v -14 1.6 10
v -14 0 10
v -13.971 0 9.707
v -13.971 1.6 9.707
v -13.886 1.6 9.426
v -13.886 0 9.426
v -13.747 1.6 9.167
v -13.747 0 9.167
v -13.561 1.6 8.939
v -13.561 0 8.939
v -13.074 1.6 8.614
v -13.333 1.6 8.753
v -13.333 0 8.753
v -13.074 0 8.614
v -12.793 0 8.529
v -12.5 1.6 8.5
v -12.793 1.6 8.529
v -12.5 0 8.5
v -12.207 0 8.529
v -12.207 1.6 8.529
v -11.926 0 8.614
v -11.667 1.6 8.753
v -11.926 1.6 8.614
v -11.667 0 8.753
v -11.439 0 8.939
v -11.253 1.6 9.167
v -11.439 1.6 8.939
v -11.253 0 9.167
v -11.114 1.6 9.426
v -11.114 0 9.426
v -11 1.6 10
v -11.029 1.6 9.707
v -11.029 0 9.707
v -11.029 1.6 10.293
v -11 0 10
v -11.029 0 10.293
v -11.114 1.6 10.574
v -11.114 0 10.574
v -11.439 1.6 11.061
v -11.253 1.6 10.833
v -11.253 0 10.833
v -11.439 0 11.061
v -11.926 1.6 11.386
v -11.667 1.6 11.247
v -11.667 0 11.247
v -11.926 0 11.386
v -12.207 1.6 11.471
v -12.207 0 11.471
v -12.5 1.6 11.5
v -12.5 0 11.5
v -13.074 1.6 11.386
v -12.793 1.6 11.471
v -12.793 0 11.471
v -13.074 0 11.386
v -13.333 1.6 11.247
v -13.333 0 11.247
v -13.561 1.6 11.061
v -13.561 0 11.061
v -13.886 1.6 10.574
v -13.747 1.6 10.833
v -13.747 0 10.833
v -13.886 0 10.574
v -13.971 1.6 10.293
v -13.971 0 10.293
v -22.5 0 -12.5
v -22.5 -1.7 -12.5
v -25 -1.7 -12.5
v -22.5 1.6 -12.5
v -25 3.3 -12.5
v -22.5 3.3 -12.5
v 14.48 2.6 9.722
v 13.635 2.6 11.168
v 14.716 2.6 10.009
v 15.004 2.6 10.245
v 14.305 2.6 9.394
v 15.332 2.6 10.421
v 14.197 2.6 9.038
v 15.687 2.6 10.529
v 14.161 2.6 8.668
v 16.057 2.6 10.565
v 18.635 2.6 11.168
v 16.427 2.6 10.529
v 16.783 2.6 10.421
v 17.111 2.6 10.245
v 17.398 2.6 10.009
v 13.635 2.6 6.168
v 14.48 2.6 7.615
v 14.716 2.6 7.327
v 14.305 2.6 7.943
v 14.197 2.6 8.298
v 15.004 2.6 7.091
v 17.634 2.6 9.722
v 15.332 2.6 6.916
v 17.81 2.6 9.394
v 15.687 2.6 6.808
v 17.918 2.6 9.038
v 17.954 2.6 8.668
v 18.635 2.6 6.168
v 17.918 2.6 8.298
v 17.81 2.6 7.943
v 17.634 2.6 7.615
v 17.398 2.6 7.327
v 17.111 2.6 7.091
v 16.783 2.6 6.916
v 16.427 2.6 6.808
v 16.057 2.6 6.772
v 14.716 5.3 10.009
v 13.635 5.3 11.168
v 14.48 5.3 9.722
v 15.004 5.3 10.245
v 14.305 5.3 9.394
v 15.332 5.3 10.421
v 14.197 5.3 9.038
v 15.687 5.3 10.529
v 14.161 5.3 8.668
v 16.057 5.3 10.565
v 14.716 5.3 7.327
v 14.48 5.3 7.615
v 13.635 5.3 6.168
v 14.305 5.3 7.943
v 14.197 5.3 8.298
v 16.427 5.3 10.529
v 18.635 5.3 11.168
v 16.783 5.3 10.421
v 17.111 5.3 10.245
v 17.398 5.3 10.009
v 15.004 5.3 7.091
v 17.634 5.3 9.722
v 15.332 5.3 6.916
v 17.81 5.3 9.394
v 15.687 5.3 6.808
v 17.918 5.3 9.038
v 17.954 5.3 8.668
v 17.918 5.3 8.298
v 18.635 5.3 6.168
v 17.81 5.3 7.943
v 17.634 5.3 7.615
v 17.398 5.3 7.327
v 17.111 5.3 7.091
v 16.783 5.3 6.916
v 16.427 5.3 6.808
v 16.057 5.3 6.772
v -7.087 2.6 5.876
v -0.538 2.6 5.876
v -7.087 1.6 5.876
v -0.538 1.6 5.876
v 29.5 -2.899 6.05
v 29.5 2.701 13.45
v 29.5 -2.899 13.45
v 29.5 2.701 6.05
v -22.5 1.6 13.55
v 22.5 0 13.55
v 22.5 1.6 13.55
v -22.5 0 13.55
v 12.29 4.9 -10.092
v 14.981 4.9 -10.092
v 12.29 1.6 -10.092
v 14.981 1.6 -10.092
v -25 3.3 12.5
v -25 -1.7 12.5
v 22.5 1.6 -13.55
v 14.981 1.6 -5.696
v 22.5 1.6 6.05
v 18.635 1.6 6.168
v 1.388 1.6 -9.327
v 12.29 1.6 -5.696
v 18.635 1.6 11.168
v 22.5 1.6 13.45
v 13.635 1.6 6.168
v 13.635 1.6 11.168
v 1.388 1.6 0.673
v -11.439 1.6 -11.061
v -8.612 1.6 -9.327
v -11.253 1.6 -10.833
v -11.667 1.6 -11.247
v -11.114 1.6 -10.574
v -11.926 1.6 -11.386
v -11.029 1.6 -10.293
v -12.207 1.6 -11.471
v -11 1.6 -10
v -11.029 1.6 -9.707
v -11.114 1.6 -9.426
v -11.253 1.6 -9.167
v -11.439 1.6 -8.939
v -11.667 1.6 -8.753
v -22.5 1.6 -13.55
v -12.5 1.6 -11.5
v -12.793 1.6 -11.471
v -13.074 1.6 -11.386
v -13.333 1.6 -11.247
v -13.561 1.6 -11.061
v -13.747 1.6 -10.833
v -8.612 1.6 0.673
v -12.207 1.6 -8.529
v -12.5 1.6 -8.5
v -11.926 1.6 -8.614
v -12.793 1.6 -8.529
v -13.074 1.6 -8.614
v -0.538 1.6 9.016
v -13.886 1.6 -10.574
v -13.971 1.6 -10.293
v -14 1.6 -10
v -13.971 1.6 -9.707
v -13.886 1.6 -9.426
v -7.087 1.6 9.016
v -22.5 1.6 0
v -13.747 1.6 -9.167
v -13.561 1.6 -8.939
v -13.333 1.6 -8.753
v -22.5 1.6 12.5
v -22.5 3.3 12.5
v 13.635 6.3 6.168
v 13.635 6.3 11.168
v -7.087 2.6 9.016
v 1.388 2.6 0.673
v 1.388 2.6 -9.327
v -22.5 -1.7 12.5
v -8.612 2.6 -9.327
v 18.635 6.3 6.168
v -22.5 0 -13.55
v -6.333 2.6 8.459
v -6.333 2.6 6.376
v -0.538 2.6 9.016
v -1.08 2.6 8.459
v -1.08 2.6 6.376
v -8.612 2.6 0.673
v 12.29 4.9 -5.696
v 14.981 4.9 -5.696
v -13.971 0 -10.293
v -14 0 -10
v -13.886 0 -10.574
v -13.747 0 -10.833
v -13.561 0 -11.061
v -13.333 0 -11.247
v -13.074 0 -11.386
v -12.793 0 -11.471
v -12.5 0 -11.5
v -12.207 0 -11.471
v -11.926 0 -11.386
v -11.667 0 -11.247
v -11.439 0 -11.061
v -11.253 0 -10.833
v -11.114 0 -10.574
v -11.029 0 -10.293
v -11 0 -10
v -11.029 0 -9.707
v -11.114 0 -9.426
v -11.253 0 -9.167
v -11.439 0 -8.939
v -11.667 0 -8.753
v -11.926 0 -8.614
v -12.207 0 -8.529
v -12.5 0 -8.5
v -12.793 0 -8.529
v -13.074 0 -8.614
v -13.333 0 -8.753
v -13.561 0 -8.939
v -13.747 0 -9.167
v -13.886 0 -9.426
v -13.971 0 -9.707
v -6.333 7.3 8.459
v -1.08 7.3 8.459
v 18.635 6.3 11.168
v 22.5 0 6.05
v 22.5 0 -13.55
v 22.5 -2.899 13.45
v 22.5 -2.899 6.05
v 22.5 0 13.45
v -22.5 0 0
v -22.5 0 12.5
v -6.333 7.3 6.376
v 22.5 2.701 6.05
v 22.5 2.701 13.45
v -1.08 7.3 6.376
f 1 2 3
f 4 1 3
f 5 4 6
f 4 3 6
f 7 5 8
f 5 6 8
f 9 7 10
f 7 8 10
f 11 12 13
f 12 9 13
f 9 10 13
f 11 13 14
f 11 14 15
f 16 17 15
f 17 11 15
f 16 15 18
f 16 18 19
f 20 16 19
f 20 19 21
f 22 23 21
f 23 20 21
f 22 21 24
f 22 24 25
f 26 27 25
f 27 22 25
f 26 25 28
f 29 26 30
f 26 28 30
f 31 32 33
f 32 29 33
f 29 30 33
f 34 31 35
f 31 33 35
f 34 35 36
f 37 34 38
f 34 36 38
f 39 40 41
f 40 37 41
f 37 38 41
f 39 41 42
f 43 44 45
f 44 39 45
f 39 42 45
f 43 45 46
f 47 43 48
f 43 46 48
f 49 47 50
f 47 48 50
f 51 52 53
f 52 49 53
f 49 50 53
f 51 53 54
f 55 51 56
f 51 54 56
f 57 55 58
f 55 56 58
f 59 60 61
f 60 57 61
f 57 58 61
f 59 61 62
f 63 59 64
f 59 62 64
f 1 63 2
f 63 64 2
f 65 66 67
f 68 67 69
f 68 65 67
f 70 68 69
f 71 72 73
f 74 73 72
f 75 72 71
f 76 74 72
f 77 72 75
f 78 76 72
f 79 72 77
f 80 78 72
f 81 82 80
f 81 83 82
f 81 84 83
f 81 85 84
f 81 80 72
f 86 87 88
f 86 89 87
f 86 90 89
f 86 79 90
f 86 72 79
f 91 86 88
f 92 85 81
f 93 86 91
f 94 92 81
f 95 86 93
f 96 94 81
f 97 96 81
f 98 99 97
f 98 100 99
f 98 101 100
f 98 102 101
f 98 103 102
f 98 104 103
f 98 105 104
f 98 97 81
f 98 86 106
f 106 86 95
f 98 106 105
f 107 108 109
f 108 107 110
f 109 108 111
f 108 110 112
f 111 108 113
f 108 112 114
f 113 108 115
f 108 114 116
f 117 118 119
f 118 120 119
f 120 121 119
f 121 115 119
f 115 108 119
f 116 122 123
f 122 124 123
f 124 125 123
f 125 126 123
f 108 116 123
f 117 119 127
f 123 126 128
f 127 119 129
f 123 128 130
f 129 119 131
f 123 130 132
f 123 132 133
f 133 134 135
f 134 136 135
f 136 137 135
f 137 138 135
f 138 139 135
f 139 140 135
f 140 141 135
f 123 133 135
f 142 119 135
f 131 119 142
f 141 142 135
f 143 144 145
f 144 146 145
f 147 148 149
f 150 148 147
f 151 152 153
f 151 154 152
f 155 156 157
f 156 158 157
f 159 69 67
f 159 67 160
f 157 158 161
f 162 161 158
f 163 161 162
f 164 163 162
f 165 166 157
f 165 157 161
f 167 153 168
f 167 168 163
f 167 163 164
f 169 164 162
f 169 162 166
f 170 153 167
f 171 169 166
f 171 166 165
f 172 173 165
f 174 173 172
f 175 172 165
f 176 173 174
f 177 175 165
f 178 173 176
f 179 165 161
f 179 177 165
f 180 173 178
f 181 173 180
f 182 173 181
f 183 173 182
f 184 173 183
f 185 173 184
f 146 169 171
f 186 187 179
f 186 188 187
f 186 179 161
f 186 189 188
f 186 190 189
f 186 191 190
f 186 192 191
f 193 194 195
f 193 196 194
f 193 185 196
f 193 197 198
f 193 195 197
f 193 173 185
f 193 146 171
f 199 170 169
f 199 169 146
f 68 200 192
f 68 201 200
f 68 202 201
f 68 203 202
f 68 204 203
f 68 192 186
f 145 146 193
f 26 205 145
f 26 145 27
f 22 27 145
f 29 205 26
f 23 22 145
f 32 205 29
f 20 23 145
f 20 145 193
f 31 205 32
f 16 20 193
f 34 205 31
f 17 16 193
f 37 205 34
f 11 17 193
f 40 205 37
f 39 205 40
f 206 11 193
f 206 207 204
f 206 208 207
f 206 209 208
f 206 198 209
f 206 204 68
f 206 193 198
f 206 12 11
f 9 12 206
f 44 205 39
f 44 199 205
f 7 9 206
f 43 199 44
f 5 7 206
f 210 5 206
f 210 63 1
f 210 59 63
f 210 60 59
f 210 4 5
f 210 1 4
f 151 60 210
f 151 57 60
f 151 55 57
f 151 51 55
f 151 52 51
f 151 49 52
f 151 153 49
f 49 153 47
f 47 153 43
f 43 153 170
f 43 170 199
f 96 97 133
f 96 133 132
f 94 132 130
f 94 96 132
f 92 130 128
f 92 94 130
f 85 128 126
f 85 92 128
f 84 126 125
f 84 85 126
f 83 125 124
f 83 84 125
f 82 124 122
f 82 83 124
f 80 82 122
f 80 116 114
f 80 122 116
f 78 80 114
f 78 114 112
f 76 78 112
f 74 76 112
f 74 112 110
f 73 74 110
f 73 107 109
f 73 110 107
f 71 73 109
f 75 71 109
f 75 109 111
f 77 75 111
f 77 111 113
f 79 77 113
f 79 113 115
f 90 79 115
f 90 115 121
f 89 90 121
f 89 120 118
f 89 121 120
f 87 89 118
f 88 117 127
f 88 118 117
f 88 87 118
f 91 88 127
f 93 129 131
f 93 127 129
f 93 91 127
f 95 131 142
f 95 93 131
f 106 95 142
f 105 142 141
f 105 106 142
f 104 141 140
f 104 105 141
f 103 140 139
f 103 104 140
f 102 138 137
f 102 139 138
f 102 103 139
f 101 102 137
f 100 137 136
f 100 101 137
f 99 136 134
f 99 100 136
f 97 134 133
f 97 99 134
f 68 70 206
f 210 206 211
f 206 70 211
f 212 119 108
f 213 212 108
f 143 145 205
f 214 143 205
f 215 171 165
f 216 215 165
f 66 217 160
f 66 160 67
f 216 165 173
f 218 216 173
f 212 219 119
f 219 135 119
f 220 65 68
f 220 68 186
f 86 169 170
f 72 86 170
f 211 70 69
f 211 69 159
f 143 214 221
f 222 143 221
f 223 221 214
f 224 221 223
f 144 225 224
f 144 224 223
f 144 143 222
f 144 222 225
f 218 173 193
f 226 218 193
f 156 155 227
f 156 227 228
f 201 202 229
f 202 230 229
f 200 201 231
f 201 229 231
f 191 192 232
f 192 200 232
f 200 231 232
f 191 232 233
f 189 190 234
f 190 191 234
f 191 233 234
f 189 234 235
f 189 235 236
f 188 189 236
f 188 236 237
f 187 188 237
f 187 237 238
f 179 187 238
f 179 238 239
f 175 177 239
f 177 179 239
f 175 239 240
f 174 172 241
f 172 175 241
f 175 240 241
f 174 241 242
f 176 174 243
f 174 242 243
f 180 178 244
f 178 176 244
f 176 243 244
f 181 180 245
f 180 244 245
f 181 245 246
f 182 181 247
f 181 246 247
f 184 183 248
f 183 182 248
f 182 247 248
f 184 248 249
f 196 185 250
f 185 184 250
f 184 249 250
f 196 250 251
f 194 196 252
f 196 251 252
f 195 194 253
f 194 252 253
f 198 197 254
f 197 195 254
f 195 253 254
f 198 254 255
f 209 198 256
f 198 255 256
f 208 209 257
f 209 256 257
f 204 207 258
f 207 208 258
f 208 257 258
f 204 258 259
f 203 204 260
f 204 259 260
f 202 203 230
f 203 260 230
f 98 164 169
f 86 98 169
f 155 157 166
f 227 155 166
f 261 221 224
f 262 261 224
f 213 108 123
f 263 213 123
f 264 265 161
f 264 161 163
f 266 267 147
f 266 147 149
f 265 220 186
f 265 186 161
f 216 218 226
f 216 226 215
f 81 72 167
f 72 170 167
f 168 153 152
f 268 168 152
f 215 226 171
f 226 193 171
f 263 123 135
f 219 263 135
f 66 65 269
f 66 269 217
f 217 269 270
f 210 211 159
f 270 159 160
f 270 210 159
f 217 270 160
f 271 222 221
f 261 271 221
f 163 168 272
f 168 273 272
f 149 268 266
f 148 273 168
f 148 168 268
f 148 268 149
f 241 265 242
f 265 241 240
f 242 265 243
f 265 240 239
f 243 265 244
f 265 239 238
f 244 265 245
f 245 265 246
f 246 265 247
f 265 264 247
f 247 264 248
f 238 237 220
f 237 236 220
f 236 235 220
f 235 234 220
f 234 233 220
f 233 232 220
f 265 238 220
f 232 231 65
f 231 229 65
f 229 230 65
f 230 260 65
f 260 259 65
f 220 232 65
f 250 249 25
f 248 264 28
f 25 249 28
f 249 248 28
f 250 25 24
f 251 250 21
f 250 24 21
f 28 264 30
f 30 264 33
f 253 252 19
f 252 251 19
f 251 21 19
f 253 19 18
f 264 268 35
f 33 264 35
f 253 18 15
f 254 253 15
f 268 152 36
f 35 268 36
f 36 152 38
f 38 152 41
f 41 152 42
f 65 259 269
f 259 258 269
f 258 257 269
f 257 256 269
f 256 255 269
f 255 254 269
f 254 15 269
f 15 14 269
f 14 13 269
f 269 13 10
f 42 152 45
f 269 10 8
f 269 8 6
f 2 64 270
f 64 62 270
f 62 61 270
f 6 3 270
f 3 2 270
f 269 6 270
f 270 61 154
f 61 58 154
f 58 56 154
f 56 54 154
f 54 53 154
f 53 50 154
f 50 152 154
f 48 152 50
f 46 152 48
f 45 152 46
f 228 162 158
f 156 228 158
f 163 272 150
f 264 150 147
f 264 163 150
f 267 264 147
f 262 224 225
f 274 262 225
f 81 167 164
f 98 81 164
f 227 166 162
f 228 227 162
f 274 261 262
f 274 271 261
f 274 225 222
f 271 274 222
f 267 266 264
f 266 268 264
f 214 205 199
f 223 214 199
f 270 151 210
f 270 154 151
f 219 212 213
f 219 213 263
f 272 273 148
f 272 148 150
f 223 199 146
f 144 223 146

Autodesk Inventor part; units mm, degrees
ref_plane "YZ Plane" through (0, 0, 0) normal (1, 0, 0) x (0, 1, 0)
ref_plane "XZ Plane" through (0, 0, 0) normal (0, 1, 0) x (-1, 0, 0)
ref_plane "XY Plane" through (0, 0, 0) normal (0, 0, 1) x (1, 0, 0)
sketch "Boceto1" plane through (0, 0, 0) normal (0, 1, 0) x (-1, 0, 0)
  line L0 (-22.5, 13.55) -> (22.5, 13.55)
  line L1 (22.5, 13.55) -> (22.5, -13.55)
  line L2 (22.5, -13.55) -> (-22.5, -13.55)
  line L3 (-22.5, -13.55) -> (-22.5, 13.55)
  line L4 (-22.5, 13.55) -> (22.5, -13.55) construction
  line L5 (22.5, 13.55) -> (-22.5, -13.55) construction
  line L6 (22.5, 0) -> (12.5, 0)
  line L7 (12.5, 0) -> (12.5, 10)
  line L8 (12.5, 10) -> (12.5, -10)
  circle A0 centre (12.5, 10) radius 1.5
  circle A1 centre (12.5, -10) radius 1.5
  point P0 (0, 0)
  dimension "d0" = 45
  dimension "d1" = 27.1
  dimension "d2" = 10
  dimension "d3" = 10
  dimension "d4" = 20
  dimension "d5" = 3
  dimension "d6" = 3
extrude "Extrusión1" add sketch "Boceto1" along normal blind 1.6
sketch "Boceto2" plane through (-22.5, 0, -13.55) normal (-1, 0, 0) x (0, 0, 1)
  line L0 (13.55, 0) -> (13.55, 1.6)
  line L1 (27.1, 1.6) -> (0, 1.6) projected
  line L2 (26.05, -1.7) -> (1.05, -1.7)
  line L3 (1.05, -1.7) -> (1.05, 3.3)
  line L4 (1.05, 3.3) -> (26.05, 3.3)
  line L5 (26.05, 3.3) -> (26.05, -1.7)
  line L6 (26.05, -1.7) -> (1.05, 3.3) construction
  line L7 (1.05, -1.7) -> (26.05, 3.3) construction
  point P0 (13.55, 0.8)
  dimension "d9" = 25
  dimension "d10" = 5
extrude "Extrusión2" add sketch "Boceto2" along normal blind 2.5
sketch "Boceto3" plane through (22.5, 0, 13.55) normal (1, 0, 0) x (0, 0, -1)
  line L0 (0, 2.7012) -> (7.5, 2.7012)
  line L1 (7.5, 2.7012) -> (7.5, -2.8988)
  line L2 (7.5, -2.8988) -> (0, -2.8988)
  line L3 (0, -2.8988) -> (0, 2.7012)
  point P0 (13.55, 0)
  dimension "d13" = 7.5
  dimension "d14" = 5.6
extrude "Extrusión3" add sketch "Boceto3" along normal blind 7
sketch "Boceto4" plane through (0, 1.6, 0) normal (0, 1, 0) x (1, 0, 0)
  line L0 (-8.6118, -0.6728) -> (1.3882, -0.6728)
  line L1 (1.3882, -0.6728) -> (1.3882, 9.3272)
  line L2 (1.3882, 9.3272) -> (-8.6118, 9.3272)
  line L3 (-8.6118, 9.3272) -> (-8.6118, -0.6728)
  line L4 (-7.0868, -9.0155) -> (-0.5382, -9.0155)
  line L5 (-0.5382, -9.0155) -> (-0.5382, -5.8757)
  line L6 (-0.5382, -5.8757) -> (-7.0868, -5.8757)
  line L7 (-7.0868, -5.8757) -> (-7.0868, -9.0155)
  line L8 (12.2897, 5.6963) -> (14.9809, 5.6963)
  line L9 (14.9809, 5.6963) -> (14.9809, 10.0919)
  line L10 (14.9809, 10.0919) -> (12.2897, 10.0919)
  line L11 (12.2897, 10.0919) -> (12.2897, 5.6963)
  line L12 (13.6353, -11.1684) -> (18.6353, -11.1684)
  line L13 (18.6353, -11.1684) -> (18.6353, -6.1684)
  line L14 (18.6353, -6.1684) -> (13.6353, -6.1684)
  line L15 (13.6353, -6.1684) -> (13.6353, -11.1684)
  point P0 (0, 0)
  dimension "d17" = 10
  dimension "d18" = 10
  dimension "d19" = 5
  dimension "d20" = 5
extrude "Extrusión4" add sketch "Boceto4" along normal blind 1
sketch "Boceto5" plane through (0, 2.6, 0) normal (0, 1, 0) x (1, 0, 0)
  line L0 (-6.3329, -8.4587) -> (-1.0802, -8.4587)
  line L1 (-1.0802, -8.4587) -> (-1.0802, -6.3765)
  line L2 (-1.0802, -6.3765) -> (-6.3329, -6.3765)
  line L3 (-6.3329, -6.3765) -> (-6.3329, -8.4587)
  point P0 (0, 0)
extrude "Extrusión5" add sketch "Boceto5" along normal blind 4.7
sketch "Boceto6" plane through (0, 2.6, 0) normal (0, 1, 0) x (1, 0, 0)
  circle A0 centre (16.0574, -8.6684) radius 1.8966
  point P0 (0, 0)
extrude "Extrusión6" add sketch "Boceto6" along normal blind 2.7
sketch "Boceto7" plane through (16.0574, 5.3, 8.6684) normal (0, 1, 0) x (1, 0, 0)
  circle A0 centre (0, 0) radius 1.8966 projected
  line L0 (2.5779, -2.5) -> (2.5779, 2.5) projected
  line L1 (2.5779, 2.5) -> (-2.4221, 2.5) projected
  line L2 (-2.4221, 2.5) -> (-2.4221, -2.5) projected
  line L3 (-2.4221, -2.5) -> (2.5779, -2.5) projected
  circle A1 centre (0, 0) radius 1.8966 projected
  point P0 (-16.0574, 8.6684)
extrude "Extrusión7" add sketch "Boceto7" along normal blind 1 contours A0 | L3 L2 L1 L0
sketch "Boceto8" plane through (0, 2.6, 0) normal (0, 1, 0) x (1, 0, 0)
  line L0 (14.9809, 5.6963) -> (14.9809, 10.0919) projected
  line L1 (14.9809, 10.0919) -> (12.2897, 10.0919) projected
  line L2 (12.2897, 10.0919) -> (12.2897, 5.6963) projected
  line L3 (12.2897, 5.6963) -> (14.9809, 5.6963) projected
  point P0 (0, 0)
extrude "Extrusión8" add sketch "Boceto8" along normal blind 2.3
sketch "Boceto9" plane through (-22.5, 0, 13.55) normal (0, 0, 1) x (1, 0, 0)
  line L0 (52, -2.8988) -> (52, 2.7012) projected
  line L1 (45, -2.8988) -> (52, -2.8988) projected
  line L2 (52, 2.7012) -> (45, 2.7012)
  line L3 (45, 2.7012) -> (45, -2.8988)
  line L4 (45, -2.8988) -> (52, -2.8988)
  line L5 (52, -2.8988) -> (52, 2.7012)
  point P0 (22.5, 0)
extrude "Extrusión9" cut sketch "Boceto9" against normal blind 0.1
properties part number "Nano-modem"
